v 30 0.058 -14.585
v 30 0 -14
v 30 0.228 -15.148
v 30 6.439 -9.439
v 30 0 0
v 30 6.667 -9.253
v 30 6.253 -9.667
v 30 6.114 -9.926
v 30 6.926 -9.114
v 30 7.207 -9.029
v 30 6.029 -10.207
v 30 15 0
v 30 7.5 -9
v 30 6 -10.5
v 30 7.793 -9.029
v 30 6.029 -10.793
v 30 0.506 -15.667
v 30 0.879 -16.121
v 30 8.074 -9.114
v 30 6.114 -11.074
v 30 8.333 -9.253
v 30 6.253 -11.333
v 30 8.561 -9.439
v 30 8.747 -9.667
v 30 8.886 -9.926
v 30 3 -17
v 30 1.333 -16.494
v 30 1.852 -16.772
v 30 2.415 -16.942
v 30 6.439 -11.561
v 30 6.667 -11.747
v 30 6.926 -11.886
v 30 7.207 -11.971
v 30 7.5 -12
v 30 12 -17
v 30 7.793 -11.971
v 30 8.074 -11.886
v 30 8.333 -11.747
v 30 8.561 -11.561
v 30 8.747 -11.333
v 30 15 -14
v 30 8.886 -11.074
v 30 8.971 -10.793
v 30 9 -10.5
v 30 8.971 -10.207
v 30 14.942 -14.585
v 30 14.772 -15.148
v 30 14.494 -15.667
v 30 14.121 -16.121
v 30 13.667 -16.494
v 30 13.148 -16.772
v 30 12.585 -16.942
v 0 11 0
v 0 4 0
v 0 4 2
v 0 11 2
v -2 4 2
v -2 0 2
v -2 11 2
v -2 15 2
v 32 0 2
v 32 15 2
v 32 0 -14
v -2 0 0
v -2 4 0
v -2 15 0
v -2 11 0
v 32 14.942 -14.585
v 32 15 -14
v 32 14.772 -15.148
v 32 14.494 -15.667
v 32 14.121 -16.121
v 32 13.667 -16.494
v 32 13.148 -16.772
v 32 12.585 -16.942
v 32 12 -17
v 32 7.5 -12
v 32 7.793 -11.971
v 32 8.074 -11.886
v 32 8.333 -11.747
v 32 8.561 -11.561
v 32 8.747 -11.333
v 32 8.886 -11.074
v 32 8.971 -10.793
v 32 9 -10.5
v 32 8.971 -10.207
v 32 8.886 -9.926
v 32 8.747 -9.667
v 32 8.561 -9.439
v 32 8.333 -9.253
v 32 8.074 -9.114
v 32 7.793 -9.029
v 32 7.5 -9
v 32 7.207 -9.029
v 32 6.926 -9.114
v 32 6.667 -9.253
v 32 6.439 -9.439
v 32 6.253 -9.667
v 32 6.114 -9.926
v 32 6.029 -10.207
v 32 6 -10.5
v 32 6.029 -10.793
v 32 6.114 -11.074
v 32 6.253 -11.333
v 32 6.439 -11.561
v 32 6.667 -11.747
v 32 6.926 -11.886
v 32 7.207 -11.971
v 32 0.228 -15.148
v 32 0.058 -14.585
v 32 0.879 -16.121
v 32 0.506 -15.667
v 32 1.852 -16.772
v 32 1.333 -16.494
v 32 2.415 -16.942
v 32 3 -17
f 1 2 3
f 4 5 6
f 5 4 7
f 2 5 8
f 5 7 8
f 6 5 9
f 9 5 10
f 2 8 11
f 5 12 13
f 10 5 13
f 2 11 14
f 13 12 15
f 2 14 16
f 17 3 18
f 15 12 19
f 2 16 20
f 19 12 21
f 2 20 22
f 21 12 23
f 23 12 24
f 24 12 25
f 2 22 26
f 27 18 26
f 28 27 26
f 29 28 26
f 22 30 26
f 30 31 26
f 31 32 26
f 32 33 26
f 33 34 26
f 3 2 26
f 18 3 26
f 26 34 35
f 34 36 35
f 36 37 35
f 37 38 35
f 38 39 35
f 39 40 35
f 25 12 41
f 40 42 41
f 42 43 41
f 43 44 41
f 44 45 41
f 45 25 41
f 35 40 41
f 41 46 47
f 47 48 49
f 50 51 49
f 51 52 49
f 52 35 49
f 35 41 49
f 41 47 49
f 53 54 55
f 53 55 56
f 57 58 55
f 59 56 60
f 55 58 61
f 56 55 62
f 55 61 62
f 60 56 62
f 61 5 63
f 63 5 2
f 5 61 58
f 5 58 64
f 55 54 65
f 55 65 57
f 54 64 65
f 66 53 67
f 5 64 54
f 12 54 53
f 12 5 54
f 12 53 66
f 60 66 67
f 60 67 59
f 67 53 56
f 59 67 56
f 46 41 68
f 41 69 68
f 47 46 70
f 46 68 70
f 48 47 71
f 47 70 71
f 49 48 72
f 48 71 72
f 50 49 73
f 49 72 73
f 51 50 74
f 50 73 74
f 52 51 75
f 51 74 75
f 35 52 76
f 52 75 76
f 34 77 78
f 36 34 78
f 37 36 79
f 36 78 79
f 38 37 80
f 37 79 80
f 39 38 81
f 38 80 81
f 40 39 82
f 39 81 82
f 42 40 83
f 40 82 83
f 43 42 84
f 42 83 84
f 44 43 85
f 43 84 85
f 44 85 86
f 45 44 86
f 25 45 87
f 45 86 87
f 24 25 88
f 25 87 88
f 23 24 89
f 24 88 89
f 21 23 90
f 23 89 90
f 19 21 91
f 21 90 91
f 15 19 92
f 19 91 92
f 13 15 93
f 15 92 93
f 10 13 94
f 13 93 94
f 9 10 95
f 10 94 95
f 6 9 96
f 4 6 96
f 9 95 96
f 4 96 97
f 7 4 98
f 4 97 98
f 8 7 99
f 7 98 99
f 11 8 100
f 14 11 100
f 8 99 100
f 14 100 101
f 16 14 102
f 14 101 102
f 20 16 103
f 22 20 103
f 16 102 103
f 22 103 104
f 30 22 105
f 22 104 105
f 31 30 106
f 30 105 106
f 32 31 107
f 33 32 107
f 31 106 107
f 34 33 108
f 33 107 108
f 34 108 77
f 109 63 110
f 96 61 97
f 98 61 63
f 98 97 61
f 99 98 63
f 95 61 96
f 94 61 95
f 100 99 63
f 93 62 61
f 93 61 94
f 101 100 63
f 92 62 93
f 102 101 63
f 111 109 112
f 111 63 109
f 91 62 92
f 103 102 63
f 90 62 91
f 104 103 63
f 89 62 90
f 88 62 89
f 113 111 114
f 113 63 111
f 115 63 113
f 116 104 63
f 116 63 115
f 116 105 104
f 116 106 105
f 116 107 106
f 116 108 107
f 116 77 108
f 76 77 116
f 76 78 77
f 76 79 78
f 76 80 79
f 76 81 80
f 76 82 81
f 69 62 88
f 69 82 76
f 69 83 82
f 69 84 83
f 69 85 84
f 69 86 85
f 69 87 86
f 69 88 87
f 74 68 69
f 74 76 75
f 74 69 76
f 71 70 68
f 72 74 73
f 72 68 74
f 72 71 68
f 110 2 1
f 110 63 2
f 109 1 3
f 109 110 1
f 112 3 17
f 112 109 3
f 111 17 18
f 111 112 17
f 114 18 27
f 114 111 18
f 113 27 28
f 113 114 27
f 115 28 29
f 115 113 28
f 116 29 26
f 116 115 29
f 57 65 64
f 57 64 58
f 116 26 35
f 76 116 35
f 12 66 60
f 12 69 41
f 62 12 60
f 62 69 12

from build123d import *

# Parameters (mm, degrees)
SKETCH1_W           = 30
SKETCH1_H           = 15
BOSS_EXTRUDE1_DEPTH = 2
SKETCH2_W           = 19
SKETCH2_H           = 15
BOSS_EXTRUDE2_DEPTH = 2
SKETCH3_R           = 1.5
CUT_EXTRUDE1_DEPTH  = 2
FILLET1_R           = 3
SKETCH4_W           = 2
SKETCH4_H           = 4
BOSS_EXTRUDE3_DEPTH = 2


with BuildPart() as part:
    # Sketch1 → Boss-Extrude1 (new body)
    with BuildSketch(Plane.XY):
        with Locations((15, 7.5)):
            Rectangle(SKETCH1_W, SKETCH1_H)
    extrude(amount=BOSS_EXTRUDE1_DEPTH)

    # Sketch2 → Boss-Extrude2 (add)
    with BuildSketch(Plane(origin=(30, 0, 0), x_dir=(0, 0, -1), z_dir=(1, 0, 0))):
        with Locations((7.5, 7.5)):
            Rectangle(SKETCH2_W, SKETCH2_H)
    extrude(amount=BOSS_EXTRUDE2_DEPTH)

    # Sketch3 → Cut-Extrude1 (cut)
    with BuildSketch(Plane(origin=(32, 0, 0), x_dir=(0, 0, -1), z_dir=(1, 0, 0))):
        with Locations((10.5, 7.5)):
            Circle(SKETCH3_R)
    extrude(amount=-CUT_EXTRUDE1_DEPTH, mode=Mode.SUBTRACT)

    # Fillet1
    fillet1_edges = [part.edges().sort_by_distance(p)[0] for p in [
        (31, 0, -17),
        (31, 15, -17),
    ]]
    fillet(fillet1_edges, radius=FILLET1_R)

    # Sketch4 → Boss-Extrude3 (add)
    with BuildSketch(Plane.ZY):
        with Locations((1, 13)):
            Rectangle(SKETCH4_W, SKETCH4_H)
        with Locations((1, 2)):
            Rectangle(SKETCH4_W, SKETCH4_H)
    extrude(amount=BOSS_EXTRUDE3_DEPTH)


solid = part.part
